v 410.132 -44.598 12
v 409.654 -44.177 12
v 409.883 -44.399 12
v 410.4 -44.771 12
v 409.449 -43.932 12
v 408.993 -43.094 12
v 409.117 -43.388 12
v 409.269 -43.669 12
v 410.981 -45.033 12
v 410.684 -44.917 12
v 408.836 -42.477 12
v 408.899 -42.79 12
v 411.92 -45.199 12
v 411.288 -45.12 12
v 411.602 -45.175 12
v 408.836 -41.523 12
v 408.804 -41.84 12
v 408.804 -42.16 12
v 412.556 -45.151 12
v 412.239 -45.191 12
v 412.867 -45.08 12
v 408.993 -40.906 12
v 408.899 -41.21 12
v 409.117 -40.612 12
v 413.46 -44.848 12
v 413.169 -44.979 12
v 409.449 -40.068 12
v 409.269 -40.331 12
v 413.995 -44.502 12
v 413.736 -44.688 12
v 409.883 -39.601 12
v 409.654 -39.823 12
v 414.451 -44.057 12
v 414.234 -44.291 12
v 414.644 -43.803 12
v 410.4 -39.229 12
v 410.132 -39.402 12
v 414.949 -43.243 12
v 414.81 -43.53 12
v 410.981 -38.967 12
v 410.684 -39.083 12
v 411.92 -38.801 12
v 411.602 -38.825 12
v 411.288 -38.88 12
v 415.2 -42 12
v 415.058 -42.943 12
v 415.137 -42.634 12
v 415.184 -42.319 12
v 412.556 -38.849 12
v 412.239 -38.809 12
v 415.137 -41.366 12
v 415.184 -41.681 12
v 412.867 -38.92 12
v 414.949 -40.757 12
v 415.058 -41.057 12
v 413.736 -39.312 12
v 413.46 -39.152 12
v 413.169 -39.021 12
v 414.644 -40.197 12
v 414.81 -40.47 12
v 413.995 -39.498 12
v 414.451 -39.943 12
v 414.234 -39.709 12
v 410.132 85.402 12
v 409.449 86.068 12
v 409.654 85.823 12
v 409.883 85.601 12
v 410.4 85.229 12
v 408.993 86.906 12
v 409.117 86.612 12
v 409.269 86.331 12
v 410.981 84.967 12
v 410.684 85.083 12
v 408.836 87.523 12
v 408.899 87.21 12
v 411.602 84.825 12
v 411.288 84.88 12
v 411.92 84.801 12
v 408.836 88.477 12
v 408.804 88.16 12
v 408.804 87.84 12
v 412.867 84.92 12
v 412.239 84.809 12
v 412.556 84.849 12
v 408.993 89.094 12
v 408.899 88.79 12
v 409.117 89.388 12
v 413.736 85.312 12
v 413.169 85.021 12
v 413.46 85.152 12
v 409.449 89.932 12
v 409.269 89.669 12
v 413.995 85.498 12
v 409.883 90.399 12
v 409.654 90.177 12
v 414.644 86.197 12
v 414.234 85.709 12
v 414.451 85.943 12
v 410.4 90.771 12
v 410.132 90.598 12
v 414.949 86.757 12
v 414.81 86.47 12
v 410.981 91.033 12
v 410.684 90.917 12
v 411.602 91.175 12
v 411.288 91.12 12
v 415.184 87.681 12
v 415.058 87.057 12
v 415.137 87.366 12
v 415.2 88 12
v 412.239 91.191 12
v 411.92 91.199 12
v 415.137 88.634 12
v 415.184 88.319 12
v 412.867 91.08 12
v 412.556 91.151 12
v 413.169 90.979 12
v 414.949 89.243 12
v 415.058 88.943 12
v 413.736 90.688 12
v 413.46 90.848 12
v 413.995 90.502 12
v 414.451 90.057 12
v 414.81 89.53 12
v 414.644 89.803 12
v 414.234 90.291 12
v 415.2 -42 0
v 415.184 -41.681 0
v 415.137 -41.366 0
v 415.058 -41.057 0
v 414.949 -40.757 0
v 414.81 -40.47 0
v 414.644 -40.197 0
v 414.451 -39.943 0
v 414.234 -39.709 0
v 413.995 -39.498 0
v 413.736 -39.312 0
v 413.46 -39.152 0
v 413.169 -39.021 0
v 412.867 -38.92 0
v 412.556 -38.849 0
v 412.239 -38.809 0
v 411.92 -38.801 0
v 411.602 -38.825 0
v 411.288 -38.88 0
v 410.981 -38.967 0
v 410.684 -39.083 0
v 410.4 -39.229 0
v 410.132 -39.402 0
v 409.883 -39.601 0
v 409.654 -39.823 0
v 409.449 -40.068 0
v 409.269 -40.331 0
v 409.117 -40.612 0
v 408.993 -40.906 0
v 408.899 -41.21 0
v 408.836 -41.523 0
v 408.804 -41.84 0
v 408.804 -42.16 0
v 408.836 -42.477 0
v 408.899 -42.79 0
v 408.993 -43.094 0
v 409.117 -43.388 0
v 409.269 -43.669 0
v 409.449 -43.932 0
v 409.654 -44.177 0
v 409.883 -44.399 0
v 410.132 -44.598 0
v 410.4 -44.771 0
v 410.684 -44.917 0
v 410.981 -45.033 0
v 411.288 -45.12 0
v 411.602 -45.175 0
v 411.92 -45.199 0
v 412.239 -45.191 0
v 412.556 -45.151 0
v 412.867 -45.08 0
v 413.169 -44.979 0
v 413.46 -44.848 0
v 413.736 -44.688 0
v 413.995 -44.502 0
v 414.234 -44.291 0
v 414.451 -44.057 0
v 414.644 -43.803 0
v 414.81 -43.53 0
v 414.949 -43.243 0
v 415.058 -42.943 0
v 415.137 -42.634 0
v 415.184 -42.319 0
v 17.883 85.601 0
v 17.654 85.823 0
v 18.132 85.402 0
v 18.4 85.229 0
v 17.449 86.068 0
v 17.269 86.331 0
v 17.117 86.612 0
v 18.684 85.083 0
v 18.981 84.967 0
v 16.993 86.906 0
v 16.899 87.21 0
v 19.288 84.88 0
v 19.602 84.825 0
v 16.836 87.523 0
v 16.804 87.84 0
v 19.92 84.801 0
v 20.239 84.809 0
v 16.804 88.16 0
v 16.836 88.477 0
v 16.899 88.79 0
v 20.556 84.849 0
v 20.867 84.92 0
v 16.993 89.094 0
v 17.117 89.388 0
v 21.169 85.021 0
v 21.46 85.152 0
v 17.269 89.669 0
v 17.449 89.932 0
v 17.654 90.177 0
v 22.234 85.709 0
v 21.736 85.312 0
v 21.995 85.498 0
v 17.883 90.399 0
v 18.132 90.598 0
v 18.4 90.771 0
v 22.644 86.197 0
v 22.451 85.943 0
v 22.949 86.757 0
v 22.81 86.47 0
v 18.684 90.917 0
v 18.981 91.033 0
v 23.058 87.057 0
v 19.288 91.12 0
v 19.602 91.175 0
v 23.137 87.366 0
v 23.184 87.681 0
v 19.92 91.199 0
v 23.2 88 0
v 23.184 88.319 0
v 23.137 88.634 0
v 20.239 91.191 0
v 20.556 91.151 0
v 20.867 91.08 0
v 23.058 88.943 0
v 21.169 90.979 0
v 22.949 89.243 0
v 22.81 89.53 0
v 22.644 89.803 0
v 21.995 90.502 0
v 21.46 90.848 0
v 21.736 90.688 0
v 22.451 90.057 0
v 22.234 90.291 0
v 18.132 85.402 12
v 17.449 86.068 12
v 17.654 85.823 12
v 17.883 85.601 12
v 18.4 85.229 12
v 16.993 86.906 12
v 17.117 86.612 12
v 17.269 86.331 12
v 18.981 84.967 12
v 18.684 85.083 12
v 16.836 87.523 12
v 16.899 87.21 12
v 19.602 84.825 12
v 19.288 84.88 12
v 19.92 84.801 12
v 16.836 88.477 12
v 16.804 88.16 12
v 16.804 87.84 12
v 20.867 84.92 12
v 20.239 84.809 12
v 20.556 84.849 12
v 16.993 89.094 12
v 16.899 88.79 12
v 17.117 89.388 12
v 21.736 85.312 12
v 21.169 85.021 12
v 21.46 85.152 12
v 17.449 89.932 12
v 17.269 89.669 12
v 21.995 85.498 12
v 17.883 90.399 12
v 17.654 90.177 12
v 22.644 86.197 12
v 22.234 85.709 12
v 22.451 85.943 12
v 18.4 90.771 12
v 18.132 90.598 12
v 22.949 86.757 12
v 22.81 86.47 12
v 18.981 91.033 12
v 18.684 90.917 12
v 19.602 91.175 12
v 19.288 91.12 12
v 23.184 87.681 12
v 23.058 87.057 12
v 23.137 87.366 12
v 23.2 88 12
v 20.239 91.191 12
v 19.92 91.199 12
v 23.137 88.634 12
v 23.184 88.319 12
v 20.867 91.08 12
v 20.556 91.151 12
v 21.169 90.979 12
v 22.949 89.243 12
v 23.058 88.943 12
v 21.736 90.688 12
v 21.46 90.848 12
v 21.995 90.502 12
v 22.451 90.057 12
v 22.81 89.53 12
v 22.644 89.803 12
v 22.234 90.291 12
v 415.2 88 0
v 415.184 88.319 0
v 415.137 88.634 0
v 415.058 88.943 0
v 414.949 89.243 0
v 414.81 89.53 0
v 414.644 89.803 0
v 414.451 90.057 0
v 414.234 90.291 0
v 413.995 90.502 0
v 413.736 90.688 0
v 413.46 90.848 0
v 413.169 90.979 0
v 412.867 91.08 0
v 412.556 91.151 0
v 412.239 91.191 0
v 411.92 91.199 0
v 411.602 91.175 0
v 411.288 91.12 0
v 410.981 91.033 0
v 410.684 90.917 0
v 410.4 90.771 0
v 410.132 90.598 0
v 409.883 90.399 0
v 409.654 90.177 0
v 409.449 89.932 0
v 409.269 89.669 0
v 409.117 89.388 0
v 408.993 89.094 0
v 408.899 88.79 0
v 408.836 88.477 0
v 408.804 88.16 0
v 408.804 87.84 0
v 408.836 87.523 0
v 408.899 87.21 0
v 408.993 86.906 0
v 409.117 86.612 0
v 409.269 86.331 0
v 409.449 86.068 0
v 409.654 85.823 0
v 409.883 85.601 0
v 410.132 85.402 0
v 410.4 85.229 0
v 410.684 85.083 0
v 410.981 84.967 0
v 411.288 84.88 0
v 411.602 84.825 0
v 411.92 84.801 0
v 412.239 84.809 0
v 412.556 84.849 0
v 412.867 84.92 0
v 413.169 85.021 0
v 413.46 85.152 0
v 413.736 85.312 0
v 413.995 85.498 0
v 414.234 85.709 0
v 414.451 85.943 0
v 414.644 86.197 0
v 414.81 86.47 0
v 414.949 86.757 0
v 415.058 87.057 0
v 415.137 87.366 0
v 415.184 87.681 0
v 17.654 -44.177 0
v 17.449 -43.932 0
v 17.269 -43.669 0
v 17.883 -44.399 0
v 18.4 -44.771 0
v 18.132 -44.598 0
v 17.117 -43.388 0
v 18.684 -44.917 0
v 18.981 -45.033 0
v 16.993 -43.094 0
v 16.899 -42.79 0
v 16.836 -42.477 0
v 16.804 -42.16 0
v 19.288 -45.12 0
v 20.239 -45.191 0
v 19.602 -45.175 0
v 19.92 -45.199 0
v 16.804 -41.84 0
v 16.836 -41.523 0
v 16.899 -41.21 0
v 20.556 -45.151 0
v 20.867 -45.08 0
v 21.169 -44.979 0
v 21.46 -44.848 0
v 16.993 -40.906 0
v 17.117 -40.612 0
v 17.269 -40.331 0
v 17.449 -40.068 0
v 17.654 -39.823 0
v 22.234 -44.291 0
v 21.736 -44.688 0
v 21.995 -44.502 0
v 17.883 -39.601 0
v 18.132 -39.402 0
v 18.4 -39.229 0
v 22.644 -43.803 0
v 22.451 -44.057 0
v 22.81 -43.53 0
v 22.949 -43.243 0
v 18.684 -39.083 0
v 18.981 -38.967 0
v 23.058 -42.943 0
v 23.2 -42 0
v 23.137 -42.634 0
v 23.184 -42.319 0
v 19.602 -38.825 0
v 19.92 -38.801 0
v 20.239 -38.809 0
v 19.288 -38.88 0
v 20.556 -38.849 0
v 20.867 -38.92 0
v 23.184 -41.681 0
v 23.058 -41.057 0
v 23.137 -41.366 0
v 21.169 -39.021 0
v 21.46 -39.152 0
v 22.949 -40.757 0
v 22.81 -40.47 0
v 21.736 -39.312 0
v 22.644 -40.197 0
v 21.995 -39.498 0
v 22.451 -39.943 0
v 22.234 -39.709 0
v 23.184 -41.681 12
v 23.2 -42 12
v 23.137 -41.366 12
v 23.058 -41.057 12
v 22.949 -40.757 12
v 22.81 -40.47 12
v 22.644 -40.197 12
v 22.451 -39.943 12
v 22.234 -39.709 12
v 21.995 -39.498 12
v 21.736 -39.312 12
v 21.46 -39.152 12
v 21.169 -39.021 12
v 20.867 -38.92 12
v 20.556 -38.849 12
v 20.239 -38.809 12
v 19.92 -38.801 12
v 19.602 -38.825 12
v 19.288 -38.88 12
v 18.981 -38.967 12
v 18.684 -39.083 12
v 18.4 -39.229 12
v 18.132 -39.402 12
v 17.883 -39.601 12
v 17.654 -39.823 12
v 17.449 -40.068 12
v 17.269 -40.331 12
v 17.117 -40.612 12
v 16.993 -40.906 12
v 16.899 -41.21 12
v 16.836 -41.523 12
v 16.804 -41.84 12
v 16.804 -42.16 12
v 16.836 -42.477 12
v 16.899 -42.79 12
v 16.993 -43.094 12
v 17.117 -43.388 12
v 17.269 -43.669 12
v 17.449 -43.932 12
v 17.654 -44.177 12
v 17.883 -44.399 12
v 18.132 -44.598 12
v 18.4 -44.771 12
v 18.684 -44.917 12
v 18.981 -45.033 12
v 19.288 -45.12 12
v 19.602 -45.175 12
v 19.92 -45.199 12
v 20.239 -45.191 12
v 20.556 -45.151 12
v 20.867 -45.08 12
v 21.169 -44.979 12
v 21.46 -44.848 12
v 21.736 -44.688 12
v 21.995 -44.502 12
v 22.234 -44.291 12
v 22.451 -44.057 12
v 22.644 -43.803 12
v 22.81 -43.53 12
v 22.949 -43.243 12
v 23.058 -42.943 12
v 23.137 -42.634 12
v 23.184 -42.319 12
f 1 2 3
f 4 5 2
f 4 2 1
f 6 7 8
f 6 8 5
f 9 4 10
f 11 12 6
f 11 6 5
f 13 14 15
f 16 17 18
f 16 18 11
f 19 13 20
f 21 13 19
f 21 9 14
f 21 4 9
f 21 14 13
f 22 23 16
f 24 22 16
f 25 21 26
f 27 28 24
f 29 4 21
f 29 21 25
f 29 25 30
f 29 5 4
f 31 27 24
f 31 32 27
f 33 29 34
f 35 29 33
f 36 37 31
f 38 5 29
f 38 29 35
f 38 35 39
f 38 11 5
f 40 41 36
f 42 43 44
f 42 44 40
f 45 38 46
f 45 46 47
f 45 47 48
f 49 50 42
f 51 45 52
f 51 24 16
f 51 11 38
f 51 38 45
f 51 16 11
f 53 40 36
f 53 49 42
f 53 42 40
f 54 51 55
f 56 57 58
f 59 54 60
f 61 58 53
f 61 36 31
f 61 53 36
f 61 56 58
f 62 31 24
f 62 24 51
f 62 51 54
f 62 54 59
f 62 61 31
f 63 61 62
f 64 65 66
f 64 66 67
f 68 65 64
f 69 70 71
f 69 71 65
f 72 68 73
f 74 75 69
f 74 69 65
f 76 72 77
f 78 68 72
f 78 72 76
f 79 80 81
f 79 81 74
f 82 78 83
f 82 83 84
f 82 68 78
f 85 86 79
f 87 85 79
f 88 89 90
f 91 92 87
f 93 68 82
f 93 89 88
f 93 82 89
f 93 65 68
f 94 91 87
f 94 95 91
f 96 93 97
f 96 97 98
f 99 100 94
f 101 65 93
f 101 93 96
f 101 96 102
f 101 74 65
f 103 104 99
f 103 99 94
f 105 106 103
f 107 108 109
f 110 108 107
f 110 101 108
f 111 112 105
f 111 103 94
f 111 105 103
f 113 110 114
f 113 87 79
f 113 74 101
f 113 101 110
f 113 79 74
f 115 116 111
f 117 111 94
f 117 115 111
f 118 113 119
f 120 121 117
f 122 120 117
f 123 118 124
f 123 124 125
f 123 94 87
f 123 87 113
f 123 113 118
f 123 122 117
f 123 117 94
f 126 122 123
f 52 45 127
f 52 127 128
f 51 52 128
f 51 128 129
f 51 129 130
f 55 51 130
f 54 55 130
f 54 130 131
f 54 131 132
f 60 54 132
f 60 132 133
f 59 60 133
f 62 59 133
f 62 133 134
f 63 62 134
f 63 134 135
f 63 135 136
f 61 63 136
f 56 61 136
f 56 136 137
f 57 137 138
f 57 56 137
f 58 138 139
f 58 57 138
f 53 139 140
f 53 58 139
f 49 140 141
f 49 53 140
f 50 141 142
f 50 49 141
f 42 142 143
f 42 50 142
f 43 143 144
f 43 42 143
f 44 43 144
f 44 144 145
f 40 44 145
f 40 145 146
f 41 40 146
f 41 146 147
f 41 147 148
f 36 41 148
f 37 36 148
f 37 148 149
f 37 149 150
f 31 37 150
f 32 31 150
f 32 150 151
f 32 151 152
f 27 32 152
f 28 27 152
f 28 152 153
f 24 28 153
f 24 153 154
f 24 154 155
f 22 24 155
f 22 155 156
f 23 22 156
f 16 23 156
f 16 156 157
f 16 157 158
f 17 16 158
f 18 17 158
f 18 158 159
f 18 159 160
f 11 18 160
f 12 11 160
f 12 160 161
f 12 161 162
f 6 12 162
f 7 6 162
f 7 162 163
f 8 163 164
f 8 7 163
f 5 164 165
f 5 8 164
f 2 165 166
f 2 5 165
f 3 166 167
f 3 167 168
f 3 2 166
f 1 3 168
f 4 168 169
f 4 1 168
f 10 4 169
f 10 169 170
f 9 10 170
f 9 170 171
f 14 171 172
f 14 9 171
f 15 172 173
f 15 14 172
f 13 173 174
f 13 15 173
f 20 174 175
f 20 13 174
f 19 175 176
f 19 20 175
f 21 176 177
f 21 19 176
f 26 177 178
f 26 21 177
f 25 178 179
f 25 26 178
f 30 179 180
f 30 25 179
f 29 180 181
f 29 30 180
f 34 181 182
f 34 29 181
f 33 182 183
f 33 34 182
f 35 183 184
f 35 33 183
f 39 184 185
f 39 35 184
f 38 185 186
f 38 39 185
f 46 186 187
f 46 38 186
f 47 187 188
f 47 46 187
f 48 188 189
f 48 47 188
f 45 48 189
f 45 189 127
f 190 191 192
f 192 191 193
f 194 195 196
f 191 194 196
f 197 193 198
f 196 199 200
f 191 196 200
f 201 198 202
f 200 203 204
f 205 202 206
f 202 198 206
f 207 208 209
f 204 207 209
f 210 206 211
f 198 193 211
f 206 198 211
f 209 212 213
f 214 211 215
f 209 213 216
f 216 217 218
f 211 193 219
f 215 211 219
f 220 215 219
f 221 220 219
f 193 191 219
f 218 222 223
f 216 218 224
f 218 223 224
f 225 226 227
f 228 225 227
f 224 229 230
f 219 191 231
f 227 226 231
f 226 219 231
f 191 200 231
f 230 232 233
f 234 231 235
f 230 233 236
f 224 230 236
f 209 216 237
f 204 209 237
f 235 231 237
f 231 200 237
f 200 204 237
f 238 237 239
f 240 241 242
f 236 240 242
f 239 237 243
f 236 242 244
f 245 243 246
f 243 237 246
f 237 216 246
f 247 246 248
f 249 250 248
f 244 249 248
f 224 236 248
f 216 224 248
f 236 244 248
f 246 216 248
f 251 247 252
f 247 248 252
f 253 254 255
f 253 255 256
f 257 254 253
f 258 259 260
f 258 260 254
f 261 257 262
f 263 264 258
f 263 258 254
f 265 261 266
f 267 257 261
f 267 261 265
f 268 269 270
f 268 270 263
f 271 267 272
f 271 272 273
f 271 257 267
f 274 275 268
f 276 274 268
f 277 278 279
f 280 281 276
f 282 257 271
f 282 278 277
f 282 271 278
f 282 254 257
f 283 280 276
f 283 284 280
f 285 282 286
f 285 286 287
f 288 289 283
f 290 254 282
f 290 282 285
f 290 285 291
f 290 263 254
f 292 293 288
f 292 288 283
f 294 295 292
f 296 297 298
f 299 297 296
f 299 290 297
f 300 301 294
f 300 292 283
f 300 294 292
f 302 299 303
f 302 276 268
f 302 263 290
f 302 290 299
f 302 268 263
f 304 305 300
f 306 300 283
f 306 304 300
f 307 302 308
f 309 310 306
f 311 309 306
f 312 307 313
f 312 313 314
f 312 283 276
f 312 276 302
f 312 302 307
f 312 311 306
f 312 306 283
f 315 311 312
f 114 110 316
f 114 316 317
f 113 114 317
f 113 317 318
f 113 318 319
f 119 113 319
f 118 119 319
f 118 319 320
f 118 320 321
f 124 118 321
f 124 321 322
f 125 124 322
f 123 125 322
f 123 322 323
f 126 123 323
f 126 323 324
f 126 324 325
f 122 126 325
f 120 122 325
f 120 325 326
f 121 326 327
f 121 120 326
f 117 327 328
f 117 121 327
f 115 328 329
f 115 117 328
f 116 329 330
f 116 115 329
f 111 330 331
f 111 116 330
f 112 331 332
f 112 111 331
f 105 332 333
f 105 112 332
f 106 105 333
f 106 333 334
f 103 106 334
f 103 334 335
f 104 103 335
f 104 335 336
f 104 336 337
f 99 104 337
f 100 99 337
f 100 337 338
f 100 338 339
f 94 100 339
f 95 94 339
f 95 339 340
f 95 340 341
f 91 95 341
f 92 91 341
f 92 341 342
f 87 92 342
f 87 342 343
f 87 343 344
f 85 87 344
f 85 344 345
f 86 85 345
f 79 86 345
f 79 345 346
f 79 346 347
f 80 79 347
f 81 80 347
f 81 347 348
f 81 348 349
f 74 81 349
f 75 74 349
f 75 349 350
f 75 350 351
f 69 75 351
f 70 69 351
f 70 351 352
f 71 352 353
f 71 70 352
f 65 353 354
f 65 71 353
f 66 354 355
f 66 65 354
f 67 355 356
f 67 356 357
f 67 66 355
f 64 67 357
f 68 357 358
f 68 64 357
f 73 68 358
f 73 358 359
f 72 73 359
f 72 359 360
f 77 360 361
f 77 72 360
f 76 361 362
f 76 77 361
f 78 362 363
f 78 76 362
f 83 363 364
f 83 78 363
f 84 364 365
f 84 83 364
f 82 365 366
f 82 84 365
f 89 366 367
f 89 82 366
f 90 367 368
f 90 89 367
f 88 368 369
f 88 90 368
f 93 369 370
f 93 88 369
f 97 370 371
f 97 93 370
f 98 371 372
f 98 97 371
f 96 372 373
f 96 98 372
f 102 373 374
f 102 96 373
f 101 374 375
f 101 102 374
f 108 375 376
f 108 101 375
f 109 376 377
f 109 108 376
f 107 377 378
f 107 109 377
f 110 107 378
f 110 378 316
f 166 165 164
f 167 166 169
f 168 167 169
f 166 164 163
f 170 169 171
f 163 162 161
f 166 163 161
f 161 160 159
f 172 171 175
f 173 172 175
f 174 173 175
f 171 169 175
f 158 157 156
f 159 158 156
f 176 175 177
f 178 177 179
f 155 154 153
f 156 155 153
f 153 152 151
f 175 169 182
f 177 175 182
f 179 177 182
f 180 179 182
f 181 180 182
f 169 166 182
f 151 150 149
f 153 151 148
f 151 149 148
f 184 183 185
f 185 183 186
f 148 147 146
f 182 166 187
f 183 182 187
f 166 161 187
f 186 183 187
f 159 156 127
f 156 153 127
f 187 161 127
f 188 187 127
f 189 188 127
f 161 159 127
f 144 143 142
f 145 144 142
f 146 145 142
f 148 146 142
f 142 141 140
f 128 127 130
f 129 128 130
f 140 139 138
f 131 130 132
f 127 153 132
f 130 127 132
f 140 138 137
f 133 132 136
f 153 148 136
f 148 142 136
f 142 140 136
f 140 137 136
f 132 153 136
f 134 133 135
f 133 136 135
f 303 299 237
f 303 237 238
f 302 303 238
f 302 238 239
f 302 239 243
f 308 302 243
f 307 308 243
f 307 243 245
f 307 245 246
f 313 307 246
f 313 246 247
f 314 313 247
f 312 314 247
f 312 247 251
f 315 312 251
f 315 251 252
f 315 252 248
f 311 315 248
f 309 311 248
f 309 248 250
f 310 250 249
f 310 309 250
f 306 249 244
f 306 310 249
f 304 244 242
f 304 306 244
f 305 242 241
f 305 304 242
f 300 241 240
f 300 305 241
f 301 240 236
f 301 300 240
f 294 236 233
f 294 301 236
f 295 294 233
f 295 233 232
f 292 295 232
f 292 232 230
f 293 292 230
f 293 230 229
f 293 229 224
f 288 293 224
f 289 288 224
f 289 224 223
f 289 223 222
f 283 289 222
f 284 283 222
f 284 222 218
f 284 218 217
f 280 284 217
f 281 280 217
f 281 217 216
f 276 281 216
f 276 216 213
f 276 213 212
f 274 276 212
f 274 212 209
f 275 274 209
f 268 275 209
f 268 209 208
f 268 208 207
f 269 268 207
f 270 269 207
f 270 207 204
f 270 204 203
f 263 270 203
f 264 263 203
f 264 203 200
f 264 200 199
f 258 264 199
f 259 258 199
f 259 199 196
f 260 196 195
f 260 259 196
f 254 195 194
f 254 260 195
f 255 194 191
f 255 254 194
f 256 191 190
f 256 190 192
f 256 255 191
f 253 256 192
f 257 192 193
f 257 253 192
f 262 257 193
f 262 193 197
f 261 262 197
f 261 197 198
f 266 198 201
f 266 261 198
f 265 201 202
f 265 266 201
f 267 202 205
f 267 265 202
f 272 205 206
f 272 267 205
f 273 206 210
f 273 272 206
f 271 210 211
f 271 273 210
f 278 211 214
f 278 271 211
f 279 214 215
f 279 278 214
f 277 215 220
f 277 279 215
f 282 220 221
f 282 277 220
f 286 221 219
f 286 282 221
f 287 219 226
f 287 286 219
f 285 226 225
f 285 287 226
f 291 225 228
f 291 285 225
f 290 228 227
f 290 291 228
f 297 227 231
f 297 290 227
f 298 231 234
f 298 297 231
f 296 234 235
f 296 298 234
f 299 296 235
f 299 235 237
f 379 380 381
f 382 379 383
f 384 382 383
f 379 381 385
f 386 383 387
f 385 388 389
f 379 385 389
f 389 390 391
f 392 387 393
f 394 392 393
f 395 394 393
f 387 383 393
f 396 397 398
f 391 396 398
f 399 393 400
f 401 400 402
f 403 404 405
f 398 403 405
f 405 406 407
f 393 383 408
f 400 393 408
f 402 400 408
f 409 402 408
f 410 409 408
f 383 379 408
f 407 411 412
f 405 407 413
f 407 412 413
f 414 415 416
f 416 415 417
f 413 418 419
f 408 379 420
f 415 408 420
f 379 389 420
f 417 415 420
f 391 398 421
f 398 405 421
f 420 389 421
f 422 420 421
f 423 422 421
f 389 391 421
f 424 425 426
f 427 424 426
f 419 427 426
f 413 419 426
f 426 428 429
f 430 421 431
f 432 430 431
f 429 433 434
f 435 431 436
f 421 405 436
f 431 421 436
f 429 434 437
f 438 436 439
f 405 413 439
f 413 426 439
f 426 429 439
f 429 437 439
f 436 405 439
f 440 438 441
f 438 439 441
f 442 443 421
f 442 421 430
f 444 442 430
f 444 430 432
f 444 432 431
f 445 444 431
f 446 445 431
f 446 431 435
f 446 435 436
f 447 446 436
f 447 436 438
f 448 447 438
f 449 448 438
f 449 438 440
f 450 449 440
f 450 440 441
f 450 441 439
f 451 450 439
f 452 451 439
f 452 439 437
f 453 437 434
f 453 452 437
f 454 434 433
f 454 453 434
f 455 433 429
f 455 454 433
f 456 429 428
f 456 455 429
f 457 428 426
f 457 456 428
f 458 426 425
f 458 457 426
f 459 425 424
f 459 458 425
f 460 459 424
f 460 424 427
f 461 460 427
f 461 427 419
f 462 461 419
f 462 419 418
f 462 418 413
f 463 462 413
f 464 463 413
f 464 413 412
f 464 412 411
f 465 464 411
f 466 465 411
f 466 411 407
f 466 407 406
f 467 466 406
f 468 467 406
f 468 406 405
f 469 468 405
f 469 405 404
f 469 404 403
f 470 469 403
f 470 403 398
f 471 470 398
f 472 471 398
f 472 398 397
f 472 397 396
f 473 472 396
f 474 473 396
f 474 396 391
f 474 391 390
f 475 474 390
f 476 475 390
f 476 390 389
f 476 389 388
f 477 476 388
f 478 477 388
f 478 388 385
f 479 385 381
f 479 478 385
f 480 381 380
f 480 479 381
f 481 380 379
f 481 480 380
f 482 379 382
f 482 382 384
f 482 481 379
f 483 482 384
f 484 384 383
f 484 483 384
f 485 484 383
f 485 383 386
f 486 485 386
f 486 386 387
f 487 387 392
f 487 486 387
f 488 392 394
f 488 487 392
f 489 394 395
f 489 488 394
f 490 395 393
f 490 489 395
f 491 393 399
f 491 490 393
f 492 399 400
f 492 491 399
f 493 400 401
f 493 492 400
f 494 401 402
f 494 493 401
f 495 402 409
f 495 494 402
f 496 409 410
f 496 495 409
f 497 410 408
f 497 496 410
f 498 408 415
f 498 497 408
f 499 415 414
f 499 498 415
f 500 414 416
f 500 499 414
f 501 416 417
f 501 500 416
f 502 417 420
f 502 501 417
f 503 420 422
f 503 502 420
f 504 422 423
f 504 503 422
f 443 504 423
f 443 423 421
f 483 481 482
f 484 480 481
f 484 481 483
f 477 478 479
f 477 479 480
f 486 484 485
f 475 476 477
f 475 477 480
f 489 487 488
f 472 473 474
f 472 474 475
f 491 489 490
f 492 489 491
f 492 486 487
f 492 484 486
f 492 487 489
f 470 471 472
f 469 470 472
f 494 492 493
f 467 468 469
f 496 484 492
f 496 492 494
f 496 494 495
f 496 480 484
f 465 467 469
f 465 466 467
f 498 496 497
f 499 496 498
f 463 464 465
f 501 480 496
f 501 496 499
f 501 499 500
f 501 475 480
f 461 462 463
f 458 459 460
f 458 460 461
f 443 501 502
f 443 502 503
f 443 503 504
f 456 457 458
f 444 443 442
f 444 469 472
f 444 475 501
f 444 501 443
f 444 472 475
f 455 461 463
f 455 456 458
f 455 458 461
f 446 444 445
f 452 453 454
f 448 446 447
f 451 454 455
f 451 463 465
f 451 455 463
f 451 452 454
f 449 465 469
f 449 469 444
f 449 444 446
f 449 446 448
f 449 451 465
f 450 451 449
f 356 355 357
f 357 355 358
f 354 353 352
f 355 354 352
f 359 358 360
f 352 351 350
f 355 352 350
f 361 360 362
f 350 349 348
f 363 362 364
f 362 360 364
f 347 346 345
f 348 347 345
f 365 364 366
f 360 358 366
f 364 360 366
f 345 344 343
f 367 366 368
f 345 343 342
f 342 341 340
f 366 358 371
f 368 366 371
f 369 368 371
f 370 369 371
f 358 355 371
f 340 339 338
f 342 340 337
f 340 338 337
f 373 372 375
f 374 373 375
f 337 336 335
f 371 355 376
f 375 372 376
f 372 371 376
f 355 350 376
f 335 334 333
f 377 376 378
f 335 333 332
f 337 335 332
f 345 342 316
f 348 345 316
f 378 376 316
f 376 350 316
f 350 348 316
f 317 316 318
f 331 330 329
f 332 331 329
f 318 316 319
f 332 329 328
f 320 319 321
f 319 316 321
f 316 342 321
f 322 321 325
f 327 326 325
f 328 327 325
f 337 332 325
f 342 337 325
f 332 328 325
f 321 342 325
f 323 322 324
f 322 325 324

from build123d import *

# Parameters (mm, degrees)
SKETCH_1_W          = 432
SKETCH_1_H          = 330
EXTRUDE_1_DEPTH     = 12
SKETCH_2_OUTSIDE_W  = 542.75
SKETCH_2_OUTSIDE_H  = 440.75
SKETCH_2_OUTSIDE_R  = 3.2
CUT_EXTRUDE_1_DEPTH = 492.927840237


with BuildPart() as part:
    # 草图1 → 凸台-拉伸1 (new body)
    with BuildSketch(Plane.XY):
        with Locations((216, 70)):
            Rectangle(SKETCH_1_W, SKETCH_1_H)
    extrude(amount=EXTRUDE_1_DEPTH)

    # 草图2 outside → 切除-拉伸1 (cut, through all)
    with BuildSketch(Plane.XY.offset(12)):
        with Locations((216, 70)):
            Rectangle(SKETCH_2_OUTSIDE_W, SKETCH_2_OUTSIDE_H)
        with Locations((20, -42)):
            Circle(SKETCH_2_OUTSIDE_R, mode=Mode.SUBTRACT)
        with Locations((412, -42)):
            Circle(SKETCH_2_OUTSIDE_R, mode=Mode.SUBTRACT)
        with Locations((20, 88)):
            Circle(SKETCH_2_OUTSIDE_R, mode=Mode.SUBTRACT)
        with Locations((412, 88)):
            Circle(SKETCH_2_OUTSIDE_R, mode=Mode.SUBTRACT)
    extrude(amount=-CUT_EXTRUDE_1_DEPTH, mode=Mode.SUBTRACT)


with BuildPart() as cut_extrude_1_piece_1:
    # of the separate pieces the step leaves, piece 1, a body of its own (cut_extrude_1_pieces)
    add(part.part.solids().sort_by_distance((23.2, -42, 0))[0])


with BuildPart() as cut_extrude_1_piece_2:
    # of the separate pieces the step leaves, piece 2, a body of its own (cut_extrude_1_pieces)
    add(part.part.solids().sort_by_distance((23.2, 88, 0))[0])


with BuildPart() as cut_extrude_1_piece_3:
    # of the separate pieces the step leaves, piece 3, a body of its own (cut_extrude_1_pieces)
    add(part.part.solids().sort_by_distance((415.2, -42, 0))[0])


with BuildPart() as cut_extrude_1_piece_4:
    # of the separate pieces the step leaves, piece 4, a body of its own (cut_extrude_1_pieces)
    add(part.part.solids().sort_by_distance((415.2, 88, 0))[0])


solid = Compound([cut_extrude_1_piece_1.part, cut_extrude_1_piece_2.part, cut_extrude_1_piece_3.part, cut_extrude_1_piece_4.part])
